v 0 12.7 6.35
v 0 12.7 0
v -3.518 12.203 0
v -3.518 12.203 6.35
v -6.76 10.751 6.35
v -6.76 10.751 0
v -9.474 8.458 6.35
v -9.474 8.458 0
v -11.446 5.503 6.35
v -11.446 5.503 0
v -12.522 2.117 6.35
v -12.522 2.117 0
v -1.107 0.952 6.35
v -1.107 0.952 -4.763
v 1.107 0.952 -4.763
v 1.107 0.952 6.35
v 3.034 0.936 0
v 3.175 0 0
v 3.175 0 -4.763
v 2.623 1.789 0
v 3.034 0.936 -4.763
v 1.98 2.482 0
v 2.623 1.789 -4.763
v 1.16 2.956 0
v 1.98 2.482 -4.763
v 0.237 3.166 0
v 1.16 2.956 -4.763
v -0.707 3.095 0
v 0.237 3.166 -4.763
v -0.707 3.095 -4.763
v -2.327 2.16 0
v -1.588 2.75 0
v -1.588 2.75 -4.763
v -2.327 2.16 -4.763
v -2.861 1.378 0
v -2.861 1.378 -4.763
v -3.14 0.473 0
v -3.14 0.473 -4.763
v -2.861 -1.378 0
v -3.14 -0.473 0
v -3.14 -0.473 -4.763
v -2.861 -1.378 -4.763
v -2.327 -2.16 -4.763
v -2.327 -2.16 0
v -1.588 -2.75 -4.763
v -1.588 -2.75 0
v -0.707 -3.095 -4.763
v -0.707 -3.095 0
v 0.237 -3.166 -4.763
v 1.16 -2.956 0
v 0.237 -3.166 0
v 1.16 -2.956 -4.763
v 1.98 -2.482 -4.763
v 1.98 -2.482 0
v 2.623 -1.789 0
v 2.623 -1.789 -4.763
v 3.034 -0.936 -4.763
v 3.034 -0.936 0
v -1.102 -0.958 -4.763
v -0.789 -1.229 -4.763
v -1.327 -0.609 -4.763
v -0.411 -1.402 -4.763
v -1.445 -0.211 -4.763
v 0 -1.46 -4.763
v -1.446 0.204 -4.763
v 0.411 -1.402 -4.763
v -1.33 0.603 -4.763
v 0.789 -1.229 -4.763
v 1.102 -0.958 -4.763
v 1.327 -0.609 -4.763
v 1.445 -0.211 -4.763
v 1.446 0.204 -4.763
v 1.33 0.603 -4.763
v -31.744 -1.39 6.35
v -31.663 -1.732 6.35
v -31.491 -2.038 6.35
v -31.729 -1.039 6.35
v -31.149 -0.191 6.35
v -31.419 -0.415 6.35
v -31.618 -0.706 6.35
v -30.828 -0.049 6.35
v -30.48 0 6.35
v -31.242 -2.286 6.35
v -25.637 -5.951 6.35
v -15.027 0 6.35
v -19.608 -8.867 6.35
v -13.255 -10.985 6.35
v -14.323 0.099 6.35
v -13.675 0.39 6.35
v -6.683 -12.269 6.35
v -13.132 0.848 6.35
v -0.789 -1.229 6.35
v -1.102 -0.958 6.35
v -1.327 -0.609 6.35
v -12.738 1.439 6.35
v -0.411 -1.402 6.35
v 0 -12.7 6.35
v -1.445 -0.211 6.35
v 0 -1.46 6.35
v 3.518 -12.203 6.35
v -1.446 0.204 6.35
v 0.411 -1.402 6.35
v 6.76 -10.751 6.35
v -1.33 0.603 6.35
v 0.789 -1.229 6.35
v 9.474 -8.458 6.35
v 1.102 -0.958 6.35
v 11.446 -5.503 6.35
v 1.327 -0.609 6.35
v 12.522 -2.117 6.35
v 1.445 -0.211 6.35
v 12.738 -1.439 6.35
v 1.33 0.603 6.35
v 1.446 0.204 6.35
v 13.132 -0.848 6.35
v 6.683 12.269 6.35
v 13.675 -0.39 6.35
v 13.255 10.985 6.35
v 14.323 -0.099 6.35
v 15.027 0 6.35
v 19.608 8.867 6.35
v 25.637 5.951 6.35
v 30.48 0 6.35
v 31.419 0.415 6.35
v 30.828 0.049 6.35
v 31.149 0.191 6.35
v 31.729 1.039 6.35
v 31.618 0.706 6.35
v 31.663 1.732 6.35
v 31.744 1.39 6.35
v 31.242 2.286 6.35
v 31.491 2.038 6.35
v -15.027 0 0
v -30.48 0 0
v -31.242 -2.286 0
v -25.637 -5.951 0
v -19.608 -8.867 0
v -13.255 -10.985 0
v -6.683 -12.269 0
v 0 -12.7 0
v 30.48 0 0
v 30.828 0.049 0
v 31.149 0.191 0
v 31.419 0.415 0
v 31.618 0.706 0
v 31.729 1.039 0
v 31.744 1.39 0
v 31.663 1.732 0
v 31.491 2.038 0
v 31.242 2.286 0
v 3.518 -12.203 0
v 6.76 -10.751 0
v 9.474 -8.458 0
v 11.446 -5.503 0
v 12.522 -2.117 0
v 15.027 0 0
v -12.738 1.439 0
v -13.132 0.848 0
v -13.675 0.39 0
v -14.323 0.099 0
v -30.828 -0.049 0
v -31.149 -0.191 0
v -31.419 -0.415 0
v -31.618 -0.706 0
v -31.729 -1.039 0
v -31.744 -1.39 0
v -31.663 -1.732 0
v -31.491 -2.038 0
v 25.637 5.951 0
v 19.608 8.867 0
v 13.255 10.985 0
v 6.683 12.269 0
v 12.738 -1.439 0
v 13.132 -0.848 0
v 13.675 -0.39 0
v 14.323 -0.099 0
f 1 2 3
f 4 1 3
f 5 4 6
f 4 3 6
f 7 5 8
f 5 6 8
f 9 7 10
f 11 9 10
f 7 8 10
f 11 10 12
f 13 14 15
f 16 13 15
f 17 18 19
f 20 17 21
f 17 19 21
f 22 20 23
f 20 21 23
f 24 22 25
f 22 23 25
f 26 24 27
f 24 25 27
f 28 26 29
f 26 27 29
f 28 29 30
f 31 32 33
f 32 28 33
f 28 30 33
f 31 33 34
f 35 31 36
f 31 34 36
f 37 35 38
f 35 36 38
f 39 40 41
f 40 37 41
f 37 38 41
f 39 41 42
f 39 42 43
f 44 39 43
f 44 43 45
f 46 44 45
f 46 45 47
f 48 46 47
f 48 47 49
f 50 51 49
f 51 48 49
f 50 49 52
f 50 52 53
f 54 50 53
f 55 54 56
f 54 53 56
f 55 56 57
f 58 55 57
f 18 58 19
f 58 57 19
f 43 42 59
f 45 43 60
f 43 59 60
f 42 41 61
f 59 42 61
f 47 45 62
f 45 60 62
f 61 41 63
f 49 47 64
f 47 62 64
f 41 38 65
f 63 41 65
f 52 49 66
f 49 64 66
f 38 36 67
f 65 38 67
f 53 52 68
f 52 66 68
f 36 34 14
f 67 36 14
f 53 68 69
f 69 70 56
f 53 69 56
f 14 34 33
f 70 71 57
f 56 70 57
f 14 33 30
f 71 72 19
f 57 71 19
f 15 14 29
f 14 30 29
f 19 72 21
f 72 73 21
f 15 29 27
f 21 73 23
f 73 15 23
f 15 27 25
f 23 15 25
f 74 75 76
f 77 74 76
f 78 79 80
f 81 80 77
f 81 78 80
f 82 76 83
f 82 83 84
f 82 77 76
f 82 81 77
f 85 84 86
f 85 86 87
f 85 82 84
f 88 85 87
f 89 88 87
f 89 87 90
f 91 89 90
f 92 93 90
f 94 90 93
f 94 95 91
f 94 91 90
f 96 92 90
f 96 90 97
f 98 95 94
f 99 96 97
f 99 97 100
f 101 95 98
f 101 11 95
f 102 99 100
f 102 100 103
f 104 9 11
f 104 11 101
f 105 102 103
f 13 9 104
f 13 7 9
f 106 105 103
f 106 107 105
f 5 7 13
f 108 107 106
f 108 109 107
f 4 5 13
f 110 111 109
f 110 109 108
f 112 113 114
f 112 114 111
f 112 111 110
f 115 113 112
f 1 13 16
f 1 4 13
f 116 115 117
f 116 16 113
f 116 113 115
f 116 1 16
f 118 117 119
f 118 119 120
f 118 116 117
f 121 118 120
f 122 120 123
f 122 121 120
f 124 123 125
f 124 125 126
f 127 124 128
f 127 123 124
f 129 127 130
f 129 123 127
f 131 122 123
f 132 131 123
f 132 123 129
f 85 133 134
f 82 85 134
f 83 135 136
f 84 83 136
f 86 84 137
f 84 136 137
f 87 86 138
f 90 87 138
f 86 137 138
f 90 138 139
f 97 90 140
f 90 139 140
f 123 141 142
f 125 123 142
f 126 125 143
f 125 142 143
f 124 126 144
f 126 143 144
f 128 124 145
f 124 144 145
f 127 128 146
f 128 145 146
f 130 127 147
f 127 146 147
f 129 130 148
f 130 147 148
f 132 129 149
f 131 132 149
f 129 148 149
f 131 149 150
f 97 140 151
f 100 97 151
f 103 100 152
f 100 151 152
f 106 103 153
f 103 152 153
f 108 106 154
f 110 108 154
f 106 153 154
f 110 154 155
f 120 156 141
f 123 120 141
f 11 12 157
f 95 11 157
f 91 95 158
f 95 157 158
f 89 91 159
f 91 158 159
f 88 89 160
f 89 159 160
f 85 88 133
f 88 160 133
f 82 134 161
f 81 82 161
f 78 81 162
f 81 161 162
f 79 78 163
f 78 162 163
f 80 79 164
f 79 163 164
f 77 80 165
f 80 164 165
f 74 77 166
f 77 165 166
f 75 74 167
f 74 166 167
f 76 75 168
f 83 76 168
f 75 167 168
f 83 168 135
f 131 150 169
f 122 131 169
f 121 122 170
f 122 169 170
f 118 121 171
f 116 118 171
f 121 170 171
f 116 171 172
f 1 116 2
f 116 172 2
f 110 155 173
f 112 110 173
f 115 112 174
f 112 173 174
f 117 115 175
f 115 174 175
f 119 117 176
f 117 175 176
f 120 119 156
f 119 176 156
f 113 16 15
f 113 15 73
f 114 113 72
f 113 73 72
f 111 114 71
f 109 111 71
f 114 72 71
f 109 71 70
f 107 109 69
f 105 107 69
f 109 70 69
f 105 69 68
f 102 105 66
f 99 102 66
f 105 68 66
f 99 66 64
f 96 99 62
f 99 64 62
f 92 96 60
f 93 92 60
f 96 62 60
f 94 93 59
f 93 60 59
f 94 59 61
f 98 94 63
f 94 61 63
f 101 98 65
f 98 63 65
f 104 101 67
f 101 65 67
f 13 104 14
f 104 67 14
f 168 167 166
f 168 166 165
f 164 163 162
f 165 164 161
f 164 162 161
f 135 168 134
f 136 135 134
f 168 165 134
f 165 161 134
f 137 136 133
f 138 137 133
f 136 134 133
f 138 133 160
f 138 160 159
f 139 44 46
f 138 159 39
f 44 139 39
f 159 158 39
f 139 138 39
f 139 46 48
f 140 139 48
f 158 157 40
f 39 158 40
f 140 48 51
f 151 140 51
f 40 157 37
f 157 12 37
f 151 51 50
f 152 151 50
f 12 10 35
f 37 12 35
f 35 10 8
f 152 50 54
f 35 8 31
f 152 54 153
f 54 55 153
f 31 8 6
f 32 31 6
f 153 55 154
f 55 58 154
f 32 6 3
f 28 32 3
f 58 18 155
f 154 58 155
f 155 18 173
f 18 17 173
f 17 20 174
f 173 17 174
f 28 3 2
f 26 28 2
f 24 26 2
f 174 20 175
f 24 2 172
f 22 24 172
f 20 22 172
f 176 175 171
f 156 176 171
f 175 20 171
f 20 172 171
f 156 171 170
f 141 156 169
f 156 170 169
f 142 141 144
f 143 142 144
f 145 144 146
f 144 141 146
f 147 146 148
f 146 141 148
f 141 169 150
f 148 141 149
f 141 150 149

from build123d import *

# Parameters (mm, degrees)
BOSS_EXTRUDE1_DEPTH = 6.35
BOSS_EXTRUDE2_START = -11.1125
SKETCH2_R           = 3.175
BOSS_EXTRUDE2_DEPTH = 11.1125


with BuildPart() as part:
    # Sketch1 → Boss-Extrude1 (new body)
    with BuildSketch(Plane.XY):
        with BuildLine():
            Line((15.026842649, 0), (30.48, 0))
            ThreePointArc((30.48, 0), (31.684827789, 0.868390737), (31.242, 2.286))
            ThreePointArc((31.242, 2.286), (16.465979776, 10.027939329), (0, 12.7))
            ThreePointArc((0, 12.7), (-8.197814749, 9.699785221), (-12.522368874, 2.116666667))
            ThreePointArc((-12.522368874, 2.116666667), (-13.387279699, 0.600042956), (-15.026842649, 0))
            Line((-15.026842649, 0), (-30.48, 0))
            ThreePointArc((-30.48, 0), (-31.684827789, -0.868390737), (-31.242, -2.286))
            ThreePointArc((-31.242, -2.286), (-16.465979776, -10.027939329), (0, -12.7))
            ThreePointArc((0, -12.7), (8.197814749, -9.699785221), (12.522368874, -2.116666667))
            ThreePointArc((12.522368874, -2.116666667), (13.387279699, -0.600042956), (15.026842649, 0))
        make_face()
        with BuildLine():
            Line((-1.107160332, 0.9525), (1.107160332, 0.9525))
            ThreePointArc((1.107160332, 0.9525), (0, -1.4605), (-1.107160332, 0.9525))
        make_face(mode=Mode.SUBTRACT)
    extrude(amount=BOSS_EXTRUDE1_DEPTH)

    # Sketch2 → Boss-Extrude2 (add)
    with BuildSketch(Plane.XY.offset(6.35).offset(BOSS_EXTRUDE2_START)):
        Circle(SKETCH2_R)
        with BuildLine():
            Line((-1.107160332, 0.9525), (1.107160332, 0.9525))
            ThreePointArc((1.107160332, 0.9525), (0, -1.4605), (-1.107160332, 0.9525))
        make_face(mode=Mode.SUBTRACT)
    extrude(amount=BOSS_EXTRUDE2_DEPTH)


solid = part.part
